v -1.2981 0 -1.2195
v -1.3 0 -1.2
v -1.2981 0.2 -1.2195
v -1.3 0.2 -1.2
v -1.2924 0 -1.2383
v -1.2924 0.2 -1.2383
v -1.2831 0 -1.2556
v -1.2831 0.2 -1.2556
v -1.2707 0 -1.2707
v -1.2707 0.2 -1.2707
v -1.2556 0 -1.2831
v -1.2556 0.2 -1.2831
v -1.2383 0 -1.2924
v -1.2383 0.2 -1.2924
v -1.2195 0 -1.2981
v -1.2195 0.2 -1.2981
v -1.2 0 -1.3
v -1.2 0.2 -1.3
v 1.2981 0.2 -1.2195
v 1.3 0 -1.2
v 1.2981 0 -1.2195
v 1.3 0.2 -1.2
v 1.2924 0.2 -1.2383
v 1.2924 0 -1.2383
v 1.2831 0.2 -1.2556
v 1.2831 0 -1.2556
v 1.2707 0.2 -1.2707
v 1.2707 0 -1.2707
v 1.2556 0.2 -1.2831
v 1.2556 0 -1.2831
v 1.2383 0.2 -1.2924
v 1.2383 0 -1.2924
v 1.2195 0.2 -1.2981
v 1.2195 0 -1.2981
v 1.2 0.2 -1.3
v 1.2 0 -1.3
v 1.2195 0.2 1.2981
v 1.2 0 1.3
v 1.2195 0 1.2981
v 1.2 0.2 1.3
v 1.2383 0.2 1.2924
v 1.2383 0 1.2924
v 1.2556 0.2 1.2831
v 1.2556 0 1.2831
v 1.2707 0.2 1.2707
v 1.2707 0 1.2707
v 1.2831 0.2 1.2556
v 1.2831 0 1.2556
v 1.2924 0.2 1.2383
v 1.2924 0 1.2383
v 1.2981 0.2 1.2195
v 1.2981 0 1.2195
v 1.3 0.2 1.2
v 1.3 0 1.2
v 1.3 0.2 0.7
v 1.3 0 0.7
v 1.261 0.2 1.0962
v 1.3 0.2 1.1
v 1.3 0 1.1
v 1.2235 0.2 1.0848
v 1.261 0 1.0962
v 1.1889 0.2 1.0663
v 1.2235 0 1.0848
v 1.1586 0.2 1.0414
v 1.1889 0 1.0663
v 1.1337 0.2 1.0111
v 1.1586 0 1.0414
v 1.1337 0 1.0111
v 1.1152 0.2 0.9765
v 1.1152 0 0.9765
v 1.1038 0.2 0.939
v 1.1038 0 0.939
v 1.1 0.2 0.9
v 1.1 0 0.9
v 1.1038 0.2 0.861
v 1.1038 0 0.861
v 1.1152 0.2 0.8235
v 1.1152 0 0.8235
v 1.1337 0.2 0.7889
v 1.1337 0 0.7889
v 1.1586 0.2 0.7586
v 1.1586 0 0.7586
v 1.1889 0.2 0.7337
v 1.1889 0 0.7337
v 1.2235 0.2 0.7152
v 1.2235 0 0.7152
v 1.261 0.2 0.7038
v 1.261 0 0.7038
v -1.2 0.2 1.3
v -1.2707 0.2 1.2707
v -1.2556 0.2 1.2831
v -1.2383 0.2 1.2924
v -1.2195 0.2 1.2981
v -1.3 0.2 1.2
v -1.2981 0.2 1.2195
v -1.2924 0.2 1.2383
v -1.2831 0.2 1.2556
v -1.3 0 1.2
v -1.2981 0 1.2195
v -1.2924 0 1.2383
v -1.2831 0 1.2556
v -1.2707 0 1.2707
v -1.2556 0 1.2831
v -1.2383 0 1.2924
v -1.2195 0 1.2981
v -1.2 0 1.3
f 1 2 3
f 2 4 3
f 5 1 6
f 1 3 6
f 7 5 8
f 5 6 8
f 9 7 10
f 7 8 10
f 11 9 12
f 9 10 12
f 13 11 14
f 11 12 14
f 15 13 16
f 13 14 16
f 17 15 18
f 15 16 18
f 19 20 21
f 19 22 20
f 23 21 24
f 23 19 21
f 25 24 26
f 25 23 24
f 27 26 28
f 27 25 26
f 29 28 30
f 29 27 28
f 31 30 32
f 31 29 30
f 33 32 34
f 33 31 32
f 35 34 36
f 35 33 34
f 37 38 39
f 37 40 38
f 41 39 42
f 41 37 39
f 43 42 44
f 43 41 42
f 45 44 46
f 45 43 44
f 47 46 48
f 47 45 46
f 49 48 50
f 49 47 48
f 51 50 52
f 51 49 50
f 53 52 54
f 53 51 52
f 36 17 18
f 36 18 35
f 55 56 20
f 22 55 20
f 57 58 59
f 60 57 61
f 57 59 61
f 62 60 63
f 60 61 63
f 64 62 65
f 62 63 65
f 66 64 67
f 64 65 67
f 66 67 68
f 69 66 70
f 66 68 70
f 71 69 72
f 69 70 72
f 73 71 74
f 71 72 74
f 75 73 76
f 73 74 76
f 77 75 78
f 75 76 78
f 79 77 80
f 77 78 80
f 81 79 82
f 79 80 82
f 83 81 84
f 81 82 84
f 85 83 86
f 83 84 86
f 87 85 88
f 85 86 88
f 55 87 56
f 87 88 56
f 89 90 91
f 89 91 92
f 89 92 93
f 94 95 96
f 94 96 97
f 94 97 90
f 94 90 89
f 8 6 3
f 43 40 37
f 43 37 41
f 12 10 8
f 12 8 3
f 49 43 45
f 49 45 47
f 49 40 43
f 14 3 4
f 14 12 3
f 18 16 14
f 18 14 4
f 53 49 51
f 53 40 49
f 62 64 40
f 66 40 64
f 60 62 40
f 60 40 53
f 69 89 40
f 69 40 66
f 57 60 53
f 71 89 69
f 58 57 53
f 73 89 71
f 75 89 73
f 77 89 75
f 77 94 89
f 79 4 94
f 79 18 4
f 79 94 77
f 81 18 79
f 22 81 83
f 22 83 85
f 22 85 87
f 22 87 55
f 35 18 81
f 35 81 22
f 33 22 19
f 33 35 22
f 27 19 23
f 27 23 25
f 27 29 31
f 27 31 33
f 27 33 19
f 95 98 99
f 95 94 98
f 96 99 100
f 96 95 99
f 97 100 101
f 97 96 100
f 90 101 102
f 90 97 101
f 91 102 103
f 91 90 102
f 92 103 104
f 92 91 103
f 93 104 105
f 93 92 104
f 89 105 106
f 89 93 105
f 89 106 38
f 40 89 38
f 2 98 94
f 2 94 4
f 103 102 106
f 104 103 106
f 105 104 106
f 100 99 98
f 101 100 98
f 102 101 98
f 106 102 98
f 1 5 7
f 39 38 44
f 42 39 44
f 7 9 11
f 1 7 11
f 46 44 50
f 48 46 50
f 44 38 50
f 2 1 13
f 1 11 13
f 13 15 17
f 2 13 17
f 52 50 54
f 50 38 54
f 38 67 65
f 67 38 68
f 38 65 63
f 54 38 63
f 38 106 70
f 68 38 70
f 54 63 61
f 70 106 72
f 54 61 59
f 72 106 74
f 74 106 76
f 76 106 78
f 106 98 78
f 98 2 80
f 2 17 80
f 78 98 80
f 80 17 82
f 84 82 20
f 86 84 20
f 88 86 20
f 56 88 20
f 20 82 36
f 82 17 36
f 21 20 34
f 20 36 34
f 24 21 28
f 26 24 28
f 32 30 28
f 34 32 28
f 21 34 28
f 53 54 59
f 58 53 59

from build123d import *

# Parameters (mm, degrees)
SKETCH1_W           = 2.6
SKETCH1_H           = 2.6
BOSS_EXTRUDE1_DEPTH = 0.2
FILLET1_R           = 0.1
SKETCH3_R           = 0.2
CUT_EXTRUDE1_DEPTH  = 1.2


with BuildPart() as part:
    # Sketch1 → Boss-Extrude1 (new body)
    with BuildSketch(Plane(origin=(0, 0, 0), x_dir=(1, 0, 0), z_dir=(0, 1, 0))):
        Rectangle(SKETCH1_W, SKETCH1_H)
    extrude(amount=BOSS_EXTRUDE1_DEPTH)

    # Fillet1
    fillet1_edges = [part.edges().sort_by_distance(p)[0] for p in [
        (1.3, 0.1, 1.3),
        (-1.3, 0.1, 1.3),
        (-1.3, 0.1, -1.3),
        (1.3, 0.1, -1.3),
    ]]
    fillet(fillet1_edges, radius=FILLET1_R)

    # Sketch3 → Cut-Extrude1 (cut, through all)
    with BuildSketch(Plane.XZ):
        with Locations((1.3, 0.9)):
            Circle(SKETCH3_R)
    extrude(amount=-CUT_EXTRUDE1_DEPTH, mode=Mode.SUBTRACT)


solid = part.part
